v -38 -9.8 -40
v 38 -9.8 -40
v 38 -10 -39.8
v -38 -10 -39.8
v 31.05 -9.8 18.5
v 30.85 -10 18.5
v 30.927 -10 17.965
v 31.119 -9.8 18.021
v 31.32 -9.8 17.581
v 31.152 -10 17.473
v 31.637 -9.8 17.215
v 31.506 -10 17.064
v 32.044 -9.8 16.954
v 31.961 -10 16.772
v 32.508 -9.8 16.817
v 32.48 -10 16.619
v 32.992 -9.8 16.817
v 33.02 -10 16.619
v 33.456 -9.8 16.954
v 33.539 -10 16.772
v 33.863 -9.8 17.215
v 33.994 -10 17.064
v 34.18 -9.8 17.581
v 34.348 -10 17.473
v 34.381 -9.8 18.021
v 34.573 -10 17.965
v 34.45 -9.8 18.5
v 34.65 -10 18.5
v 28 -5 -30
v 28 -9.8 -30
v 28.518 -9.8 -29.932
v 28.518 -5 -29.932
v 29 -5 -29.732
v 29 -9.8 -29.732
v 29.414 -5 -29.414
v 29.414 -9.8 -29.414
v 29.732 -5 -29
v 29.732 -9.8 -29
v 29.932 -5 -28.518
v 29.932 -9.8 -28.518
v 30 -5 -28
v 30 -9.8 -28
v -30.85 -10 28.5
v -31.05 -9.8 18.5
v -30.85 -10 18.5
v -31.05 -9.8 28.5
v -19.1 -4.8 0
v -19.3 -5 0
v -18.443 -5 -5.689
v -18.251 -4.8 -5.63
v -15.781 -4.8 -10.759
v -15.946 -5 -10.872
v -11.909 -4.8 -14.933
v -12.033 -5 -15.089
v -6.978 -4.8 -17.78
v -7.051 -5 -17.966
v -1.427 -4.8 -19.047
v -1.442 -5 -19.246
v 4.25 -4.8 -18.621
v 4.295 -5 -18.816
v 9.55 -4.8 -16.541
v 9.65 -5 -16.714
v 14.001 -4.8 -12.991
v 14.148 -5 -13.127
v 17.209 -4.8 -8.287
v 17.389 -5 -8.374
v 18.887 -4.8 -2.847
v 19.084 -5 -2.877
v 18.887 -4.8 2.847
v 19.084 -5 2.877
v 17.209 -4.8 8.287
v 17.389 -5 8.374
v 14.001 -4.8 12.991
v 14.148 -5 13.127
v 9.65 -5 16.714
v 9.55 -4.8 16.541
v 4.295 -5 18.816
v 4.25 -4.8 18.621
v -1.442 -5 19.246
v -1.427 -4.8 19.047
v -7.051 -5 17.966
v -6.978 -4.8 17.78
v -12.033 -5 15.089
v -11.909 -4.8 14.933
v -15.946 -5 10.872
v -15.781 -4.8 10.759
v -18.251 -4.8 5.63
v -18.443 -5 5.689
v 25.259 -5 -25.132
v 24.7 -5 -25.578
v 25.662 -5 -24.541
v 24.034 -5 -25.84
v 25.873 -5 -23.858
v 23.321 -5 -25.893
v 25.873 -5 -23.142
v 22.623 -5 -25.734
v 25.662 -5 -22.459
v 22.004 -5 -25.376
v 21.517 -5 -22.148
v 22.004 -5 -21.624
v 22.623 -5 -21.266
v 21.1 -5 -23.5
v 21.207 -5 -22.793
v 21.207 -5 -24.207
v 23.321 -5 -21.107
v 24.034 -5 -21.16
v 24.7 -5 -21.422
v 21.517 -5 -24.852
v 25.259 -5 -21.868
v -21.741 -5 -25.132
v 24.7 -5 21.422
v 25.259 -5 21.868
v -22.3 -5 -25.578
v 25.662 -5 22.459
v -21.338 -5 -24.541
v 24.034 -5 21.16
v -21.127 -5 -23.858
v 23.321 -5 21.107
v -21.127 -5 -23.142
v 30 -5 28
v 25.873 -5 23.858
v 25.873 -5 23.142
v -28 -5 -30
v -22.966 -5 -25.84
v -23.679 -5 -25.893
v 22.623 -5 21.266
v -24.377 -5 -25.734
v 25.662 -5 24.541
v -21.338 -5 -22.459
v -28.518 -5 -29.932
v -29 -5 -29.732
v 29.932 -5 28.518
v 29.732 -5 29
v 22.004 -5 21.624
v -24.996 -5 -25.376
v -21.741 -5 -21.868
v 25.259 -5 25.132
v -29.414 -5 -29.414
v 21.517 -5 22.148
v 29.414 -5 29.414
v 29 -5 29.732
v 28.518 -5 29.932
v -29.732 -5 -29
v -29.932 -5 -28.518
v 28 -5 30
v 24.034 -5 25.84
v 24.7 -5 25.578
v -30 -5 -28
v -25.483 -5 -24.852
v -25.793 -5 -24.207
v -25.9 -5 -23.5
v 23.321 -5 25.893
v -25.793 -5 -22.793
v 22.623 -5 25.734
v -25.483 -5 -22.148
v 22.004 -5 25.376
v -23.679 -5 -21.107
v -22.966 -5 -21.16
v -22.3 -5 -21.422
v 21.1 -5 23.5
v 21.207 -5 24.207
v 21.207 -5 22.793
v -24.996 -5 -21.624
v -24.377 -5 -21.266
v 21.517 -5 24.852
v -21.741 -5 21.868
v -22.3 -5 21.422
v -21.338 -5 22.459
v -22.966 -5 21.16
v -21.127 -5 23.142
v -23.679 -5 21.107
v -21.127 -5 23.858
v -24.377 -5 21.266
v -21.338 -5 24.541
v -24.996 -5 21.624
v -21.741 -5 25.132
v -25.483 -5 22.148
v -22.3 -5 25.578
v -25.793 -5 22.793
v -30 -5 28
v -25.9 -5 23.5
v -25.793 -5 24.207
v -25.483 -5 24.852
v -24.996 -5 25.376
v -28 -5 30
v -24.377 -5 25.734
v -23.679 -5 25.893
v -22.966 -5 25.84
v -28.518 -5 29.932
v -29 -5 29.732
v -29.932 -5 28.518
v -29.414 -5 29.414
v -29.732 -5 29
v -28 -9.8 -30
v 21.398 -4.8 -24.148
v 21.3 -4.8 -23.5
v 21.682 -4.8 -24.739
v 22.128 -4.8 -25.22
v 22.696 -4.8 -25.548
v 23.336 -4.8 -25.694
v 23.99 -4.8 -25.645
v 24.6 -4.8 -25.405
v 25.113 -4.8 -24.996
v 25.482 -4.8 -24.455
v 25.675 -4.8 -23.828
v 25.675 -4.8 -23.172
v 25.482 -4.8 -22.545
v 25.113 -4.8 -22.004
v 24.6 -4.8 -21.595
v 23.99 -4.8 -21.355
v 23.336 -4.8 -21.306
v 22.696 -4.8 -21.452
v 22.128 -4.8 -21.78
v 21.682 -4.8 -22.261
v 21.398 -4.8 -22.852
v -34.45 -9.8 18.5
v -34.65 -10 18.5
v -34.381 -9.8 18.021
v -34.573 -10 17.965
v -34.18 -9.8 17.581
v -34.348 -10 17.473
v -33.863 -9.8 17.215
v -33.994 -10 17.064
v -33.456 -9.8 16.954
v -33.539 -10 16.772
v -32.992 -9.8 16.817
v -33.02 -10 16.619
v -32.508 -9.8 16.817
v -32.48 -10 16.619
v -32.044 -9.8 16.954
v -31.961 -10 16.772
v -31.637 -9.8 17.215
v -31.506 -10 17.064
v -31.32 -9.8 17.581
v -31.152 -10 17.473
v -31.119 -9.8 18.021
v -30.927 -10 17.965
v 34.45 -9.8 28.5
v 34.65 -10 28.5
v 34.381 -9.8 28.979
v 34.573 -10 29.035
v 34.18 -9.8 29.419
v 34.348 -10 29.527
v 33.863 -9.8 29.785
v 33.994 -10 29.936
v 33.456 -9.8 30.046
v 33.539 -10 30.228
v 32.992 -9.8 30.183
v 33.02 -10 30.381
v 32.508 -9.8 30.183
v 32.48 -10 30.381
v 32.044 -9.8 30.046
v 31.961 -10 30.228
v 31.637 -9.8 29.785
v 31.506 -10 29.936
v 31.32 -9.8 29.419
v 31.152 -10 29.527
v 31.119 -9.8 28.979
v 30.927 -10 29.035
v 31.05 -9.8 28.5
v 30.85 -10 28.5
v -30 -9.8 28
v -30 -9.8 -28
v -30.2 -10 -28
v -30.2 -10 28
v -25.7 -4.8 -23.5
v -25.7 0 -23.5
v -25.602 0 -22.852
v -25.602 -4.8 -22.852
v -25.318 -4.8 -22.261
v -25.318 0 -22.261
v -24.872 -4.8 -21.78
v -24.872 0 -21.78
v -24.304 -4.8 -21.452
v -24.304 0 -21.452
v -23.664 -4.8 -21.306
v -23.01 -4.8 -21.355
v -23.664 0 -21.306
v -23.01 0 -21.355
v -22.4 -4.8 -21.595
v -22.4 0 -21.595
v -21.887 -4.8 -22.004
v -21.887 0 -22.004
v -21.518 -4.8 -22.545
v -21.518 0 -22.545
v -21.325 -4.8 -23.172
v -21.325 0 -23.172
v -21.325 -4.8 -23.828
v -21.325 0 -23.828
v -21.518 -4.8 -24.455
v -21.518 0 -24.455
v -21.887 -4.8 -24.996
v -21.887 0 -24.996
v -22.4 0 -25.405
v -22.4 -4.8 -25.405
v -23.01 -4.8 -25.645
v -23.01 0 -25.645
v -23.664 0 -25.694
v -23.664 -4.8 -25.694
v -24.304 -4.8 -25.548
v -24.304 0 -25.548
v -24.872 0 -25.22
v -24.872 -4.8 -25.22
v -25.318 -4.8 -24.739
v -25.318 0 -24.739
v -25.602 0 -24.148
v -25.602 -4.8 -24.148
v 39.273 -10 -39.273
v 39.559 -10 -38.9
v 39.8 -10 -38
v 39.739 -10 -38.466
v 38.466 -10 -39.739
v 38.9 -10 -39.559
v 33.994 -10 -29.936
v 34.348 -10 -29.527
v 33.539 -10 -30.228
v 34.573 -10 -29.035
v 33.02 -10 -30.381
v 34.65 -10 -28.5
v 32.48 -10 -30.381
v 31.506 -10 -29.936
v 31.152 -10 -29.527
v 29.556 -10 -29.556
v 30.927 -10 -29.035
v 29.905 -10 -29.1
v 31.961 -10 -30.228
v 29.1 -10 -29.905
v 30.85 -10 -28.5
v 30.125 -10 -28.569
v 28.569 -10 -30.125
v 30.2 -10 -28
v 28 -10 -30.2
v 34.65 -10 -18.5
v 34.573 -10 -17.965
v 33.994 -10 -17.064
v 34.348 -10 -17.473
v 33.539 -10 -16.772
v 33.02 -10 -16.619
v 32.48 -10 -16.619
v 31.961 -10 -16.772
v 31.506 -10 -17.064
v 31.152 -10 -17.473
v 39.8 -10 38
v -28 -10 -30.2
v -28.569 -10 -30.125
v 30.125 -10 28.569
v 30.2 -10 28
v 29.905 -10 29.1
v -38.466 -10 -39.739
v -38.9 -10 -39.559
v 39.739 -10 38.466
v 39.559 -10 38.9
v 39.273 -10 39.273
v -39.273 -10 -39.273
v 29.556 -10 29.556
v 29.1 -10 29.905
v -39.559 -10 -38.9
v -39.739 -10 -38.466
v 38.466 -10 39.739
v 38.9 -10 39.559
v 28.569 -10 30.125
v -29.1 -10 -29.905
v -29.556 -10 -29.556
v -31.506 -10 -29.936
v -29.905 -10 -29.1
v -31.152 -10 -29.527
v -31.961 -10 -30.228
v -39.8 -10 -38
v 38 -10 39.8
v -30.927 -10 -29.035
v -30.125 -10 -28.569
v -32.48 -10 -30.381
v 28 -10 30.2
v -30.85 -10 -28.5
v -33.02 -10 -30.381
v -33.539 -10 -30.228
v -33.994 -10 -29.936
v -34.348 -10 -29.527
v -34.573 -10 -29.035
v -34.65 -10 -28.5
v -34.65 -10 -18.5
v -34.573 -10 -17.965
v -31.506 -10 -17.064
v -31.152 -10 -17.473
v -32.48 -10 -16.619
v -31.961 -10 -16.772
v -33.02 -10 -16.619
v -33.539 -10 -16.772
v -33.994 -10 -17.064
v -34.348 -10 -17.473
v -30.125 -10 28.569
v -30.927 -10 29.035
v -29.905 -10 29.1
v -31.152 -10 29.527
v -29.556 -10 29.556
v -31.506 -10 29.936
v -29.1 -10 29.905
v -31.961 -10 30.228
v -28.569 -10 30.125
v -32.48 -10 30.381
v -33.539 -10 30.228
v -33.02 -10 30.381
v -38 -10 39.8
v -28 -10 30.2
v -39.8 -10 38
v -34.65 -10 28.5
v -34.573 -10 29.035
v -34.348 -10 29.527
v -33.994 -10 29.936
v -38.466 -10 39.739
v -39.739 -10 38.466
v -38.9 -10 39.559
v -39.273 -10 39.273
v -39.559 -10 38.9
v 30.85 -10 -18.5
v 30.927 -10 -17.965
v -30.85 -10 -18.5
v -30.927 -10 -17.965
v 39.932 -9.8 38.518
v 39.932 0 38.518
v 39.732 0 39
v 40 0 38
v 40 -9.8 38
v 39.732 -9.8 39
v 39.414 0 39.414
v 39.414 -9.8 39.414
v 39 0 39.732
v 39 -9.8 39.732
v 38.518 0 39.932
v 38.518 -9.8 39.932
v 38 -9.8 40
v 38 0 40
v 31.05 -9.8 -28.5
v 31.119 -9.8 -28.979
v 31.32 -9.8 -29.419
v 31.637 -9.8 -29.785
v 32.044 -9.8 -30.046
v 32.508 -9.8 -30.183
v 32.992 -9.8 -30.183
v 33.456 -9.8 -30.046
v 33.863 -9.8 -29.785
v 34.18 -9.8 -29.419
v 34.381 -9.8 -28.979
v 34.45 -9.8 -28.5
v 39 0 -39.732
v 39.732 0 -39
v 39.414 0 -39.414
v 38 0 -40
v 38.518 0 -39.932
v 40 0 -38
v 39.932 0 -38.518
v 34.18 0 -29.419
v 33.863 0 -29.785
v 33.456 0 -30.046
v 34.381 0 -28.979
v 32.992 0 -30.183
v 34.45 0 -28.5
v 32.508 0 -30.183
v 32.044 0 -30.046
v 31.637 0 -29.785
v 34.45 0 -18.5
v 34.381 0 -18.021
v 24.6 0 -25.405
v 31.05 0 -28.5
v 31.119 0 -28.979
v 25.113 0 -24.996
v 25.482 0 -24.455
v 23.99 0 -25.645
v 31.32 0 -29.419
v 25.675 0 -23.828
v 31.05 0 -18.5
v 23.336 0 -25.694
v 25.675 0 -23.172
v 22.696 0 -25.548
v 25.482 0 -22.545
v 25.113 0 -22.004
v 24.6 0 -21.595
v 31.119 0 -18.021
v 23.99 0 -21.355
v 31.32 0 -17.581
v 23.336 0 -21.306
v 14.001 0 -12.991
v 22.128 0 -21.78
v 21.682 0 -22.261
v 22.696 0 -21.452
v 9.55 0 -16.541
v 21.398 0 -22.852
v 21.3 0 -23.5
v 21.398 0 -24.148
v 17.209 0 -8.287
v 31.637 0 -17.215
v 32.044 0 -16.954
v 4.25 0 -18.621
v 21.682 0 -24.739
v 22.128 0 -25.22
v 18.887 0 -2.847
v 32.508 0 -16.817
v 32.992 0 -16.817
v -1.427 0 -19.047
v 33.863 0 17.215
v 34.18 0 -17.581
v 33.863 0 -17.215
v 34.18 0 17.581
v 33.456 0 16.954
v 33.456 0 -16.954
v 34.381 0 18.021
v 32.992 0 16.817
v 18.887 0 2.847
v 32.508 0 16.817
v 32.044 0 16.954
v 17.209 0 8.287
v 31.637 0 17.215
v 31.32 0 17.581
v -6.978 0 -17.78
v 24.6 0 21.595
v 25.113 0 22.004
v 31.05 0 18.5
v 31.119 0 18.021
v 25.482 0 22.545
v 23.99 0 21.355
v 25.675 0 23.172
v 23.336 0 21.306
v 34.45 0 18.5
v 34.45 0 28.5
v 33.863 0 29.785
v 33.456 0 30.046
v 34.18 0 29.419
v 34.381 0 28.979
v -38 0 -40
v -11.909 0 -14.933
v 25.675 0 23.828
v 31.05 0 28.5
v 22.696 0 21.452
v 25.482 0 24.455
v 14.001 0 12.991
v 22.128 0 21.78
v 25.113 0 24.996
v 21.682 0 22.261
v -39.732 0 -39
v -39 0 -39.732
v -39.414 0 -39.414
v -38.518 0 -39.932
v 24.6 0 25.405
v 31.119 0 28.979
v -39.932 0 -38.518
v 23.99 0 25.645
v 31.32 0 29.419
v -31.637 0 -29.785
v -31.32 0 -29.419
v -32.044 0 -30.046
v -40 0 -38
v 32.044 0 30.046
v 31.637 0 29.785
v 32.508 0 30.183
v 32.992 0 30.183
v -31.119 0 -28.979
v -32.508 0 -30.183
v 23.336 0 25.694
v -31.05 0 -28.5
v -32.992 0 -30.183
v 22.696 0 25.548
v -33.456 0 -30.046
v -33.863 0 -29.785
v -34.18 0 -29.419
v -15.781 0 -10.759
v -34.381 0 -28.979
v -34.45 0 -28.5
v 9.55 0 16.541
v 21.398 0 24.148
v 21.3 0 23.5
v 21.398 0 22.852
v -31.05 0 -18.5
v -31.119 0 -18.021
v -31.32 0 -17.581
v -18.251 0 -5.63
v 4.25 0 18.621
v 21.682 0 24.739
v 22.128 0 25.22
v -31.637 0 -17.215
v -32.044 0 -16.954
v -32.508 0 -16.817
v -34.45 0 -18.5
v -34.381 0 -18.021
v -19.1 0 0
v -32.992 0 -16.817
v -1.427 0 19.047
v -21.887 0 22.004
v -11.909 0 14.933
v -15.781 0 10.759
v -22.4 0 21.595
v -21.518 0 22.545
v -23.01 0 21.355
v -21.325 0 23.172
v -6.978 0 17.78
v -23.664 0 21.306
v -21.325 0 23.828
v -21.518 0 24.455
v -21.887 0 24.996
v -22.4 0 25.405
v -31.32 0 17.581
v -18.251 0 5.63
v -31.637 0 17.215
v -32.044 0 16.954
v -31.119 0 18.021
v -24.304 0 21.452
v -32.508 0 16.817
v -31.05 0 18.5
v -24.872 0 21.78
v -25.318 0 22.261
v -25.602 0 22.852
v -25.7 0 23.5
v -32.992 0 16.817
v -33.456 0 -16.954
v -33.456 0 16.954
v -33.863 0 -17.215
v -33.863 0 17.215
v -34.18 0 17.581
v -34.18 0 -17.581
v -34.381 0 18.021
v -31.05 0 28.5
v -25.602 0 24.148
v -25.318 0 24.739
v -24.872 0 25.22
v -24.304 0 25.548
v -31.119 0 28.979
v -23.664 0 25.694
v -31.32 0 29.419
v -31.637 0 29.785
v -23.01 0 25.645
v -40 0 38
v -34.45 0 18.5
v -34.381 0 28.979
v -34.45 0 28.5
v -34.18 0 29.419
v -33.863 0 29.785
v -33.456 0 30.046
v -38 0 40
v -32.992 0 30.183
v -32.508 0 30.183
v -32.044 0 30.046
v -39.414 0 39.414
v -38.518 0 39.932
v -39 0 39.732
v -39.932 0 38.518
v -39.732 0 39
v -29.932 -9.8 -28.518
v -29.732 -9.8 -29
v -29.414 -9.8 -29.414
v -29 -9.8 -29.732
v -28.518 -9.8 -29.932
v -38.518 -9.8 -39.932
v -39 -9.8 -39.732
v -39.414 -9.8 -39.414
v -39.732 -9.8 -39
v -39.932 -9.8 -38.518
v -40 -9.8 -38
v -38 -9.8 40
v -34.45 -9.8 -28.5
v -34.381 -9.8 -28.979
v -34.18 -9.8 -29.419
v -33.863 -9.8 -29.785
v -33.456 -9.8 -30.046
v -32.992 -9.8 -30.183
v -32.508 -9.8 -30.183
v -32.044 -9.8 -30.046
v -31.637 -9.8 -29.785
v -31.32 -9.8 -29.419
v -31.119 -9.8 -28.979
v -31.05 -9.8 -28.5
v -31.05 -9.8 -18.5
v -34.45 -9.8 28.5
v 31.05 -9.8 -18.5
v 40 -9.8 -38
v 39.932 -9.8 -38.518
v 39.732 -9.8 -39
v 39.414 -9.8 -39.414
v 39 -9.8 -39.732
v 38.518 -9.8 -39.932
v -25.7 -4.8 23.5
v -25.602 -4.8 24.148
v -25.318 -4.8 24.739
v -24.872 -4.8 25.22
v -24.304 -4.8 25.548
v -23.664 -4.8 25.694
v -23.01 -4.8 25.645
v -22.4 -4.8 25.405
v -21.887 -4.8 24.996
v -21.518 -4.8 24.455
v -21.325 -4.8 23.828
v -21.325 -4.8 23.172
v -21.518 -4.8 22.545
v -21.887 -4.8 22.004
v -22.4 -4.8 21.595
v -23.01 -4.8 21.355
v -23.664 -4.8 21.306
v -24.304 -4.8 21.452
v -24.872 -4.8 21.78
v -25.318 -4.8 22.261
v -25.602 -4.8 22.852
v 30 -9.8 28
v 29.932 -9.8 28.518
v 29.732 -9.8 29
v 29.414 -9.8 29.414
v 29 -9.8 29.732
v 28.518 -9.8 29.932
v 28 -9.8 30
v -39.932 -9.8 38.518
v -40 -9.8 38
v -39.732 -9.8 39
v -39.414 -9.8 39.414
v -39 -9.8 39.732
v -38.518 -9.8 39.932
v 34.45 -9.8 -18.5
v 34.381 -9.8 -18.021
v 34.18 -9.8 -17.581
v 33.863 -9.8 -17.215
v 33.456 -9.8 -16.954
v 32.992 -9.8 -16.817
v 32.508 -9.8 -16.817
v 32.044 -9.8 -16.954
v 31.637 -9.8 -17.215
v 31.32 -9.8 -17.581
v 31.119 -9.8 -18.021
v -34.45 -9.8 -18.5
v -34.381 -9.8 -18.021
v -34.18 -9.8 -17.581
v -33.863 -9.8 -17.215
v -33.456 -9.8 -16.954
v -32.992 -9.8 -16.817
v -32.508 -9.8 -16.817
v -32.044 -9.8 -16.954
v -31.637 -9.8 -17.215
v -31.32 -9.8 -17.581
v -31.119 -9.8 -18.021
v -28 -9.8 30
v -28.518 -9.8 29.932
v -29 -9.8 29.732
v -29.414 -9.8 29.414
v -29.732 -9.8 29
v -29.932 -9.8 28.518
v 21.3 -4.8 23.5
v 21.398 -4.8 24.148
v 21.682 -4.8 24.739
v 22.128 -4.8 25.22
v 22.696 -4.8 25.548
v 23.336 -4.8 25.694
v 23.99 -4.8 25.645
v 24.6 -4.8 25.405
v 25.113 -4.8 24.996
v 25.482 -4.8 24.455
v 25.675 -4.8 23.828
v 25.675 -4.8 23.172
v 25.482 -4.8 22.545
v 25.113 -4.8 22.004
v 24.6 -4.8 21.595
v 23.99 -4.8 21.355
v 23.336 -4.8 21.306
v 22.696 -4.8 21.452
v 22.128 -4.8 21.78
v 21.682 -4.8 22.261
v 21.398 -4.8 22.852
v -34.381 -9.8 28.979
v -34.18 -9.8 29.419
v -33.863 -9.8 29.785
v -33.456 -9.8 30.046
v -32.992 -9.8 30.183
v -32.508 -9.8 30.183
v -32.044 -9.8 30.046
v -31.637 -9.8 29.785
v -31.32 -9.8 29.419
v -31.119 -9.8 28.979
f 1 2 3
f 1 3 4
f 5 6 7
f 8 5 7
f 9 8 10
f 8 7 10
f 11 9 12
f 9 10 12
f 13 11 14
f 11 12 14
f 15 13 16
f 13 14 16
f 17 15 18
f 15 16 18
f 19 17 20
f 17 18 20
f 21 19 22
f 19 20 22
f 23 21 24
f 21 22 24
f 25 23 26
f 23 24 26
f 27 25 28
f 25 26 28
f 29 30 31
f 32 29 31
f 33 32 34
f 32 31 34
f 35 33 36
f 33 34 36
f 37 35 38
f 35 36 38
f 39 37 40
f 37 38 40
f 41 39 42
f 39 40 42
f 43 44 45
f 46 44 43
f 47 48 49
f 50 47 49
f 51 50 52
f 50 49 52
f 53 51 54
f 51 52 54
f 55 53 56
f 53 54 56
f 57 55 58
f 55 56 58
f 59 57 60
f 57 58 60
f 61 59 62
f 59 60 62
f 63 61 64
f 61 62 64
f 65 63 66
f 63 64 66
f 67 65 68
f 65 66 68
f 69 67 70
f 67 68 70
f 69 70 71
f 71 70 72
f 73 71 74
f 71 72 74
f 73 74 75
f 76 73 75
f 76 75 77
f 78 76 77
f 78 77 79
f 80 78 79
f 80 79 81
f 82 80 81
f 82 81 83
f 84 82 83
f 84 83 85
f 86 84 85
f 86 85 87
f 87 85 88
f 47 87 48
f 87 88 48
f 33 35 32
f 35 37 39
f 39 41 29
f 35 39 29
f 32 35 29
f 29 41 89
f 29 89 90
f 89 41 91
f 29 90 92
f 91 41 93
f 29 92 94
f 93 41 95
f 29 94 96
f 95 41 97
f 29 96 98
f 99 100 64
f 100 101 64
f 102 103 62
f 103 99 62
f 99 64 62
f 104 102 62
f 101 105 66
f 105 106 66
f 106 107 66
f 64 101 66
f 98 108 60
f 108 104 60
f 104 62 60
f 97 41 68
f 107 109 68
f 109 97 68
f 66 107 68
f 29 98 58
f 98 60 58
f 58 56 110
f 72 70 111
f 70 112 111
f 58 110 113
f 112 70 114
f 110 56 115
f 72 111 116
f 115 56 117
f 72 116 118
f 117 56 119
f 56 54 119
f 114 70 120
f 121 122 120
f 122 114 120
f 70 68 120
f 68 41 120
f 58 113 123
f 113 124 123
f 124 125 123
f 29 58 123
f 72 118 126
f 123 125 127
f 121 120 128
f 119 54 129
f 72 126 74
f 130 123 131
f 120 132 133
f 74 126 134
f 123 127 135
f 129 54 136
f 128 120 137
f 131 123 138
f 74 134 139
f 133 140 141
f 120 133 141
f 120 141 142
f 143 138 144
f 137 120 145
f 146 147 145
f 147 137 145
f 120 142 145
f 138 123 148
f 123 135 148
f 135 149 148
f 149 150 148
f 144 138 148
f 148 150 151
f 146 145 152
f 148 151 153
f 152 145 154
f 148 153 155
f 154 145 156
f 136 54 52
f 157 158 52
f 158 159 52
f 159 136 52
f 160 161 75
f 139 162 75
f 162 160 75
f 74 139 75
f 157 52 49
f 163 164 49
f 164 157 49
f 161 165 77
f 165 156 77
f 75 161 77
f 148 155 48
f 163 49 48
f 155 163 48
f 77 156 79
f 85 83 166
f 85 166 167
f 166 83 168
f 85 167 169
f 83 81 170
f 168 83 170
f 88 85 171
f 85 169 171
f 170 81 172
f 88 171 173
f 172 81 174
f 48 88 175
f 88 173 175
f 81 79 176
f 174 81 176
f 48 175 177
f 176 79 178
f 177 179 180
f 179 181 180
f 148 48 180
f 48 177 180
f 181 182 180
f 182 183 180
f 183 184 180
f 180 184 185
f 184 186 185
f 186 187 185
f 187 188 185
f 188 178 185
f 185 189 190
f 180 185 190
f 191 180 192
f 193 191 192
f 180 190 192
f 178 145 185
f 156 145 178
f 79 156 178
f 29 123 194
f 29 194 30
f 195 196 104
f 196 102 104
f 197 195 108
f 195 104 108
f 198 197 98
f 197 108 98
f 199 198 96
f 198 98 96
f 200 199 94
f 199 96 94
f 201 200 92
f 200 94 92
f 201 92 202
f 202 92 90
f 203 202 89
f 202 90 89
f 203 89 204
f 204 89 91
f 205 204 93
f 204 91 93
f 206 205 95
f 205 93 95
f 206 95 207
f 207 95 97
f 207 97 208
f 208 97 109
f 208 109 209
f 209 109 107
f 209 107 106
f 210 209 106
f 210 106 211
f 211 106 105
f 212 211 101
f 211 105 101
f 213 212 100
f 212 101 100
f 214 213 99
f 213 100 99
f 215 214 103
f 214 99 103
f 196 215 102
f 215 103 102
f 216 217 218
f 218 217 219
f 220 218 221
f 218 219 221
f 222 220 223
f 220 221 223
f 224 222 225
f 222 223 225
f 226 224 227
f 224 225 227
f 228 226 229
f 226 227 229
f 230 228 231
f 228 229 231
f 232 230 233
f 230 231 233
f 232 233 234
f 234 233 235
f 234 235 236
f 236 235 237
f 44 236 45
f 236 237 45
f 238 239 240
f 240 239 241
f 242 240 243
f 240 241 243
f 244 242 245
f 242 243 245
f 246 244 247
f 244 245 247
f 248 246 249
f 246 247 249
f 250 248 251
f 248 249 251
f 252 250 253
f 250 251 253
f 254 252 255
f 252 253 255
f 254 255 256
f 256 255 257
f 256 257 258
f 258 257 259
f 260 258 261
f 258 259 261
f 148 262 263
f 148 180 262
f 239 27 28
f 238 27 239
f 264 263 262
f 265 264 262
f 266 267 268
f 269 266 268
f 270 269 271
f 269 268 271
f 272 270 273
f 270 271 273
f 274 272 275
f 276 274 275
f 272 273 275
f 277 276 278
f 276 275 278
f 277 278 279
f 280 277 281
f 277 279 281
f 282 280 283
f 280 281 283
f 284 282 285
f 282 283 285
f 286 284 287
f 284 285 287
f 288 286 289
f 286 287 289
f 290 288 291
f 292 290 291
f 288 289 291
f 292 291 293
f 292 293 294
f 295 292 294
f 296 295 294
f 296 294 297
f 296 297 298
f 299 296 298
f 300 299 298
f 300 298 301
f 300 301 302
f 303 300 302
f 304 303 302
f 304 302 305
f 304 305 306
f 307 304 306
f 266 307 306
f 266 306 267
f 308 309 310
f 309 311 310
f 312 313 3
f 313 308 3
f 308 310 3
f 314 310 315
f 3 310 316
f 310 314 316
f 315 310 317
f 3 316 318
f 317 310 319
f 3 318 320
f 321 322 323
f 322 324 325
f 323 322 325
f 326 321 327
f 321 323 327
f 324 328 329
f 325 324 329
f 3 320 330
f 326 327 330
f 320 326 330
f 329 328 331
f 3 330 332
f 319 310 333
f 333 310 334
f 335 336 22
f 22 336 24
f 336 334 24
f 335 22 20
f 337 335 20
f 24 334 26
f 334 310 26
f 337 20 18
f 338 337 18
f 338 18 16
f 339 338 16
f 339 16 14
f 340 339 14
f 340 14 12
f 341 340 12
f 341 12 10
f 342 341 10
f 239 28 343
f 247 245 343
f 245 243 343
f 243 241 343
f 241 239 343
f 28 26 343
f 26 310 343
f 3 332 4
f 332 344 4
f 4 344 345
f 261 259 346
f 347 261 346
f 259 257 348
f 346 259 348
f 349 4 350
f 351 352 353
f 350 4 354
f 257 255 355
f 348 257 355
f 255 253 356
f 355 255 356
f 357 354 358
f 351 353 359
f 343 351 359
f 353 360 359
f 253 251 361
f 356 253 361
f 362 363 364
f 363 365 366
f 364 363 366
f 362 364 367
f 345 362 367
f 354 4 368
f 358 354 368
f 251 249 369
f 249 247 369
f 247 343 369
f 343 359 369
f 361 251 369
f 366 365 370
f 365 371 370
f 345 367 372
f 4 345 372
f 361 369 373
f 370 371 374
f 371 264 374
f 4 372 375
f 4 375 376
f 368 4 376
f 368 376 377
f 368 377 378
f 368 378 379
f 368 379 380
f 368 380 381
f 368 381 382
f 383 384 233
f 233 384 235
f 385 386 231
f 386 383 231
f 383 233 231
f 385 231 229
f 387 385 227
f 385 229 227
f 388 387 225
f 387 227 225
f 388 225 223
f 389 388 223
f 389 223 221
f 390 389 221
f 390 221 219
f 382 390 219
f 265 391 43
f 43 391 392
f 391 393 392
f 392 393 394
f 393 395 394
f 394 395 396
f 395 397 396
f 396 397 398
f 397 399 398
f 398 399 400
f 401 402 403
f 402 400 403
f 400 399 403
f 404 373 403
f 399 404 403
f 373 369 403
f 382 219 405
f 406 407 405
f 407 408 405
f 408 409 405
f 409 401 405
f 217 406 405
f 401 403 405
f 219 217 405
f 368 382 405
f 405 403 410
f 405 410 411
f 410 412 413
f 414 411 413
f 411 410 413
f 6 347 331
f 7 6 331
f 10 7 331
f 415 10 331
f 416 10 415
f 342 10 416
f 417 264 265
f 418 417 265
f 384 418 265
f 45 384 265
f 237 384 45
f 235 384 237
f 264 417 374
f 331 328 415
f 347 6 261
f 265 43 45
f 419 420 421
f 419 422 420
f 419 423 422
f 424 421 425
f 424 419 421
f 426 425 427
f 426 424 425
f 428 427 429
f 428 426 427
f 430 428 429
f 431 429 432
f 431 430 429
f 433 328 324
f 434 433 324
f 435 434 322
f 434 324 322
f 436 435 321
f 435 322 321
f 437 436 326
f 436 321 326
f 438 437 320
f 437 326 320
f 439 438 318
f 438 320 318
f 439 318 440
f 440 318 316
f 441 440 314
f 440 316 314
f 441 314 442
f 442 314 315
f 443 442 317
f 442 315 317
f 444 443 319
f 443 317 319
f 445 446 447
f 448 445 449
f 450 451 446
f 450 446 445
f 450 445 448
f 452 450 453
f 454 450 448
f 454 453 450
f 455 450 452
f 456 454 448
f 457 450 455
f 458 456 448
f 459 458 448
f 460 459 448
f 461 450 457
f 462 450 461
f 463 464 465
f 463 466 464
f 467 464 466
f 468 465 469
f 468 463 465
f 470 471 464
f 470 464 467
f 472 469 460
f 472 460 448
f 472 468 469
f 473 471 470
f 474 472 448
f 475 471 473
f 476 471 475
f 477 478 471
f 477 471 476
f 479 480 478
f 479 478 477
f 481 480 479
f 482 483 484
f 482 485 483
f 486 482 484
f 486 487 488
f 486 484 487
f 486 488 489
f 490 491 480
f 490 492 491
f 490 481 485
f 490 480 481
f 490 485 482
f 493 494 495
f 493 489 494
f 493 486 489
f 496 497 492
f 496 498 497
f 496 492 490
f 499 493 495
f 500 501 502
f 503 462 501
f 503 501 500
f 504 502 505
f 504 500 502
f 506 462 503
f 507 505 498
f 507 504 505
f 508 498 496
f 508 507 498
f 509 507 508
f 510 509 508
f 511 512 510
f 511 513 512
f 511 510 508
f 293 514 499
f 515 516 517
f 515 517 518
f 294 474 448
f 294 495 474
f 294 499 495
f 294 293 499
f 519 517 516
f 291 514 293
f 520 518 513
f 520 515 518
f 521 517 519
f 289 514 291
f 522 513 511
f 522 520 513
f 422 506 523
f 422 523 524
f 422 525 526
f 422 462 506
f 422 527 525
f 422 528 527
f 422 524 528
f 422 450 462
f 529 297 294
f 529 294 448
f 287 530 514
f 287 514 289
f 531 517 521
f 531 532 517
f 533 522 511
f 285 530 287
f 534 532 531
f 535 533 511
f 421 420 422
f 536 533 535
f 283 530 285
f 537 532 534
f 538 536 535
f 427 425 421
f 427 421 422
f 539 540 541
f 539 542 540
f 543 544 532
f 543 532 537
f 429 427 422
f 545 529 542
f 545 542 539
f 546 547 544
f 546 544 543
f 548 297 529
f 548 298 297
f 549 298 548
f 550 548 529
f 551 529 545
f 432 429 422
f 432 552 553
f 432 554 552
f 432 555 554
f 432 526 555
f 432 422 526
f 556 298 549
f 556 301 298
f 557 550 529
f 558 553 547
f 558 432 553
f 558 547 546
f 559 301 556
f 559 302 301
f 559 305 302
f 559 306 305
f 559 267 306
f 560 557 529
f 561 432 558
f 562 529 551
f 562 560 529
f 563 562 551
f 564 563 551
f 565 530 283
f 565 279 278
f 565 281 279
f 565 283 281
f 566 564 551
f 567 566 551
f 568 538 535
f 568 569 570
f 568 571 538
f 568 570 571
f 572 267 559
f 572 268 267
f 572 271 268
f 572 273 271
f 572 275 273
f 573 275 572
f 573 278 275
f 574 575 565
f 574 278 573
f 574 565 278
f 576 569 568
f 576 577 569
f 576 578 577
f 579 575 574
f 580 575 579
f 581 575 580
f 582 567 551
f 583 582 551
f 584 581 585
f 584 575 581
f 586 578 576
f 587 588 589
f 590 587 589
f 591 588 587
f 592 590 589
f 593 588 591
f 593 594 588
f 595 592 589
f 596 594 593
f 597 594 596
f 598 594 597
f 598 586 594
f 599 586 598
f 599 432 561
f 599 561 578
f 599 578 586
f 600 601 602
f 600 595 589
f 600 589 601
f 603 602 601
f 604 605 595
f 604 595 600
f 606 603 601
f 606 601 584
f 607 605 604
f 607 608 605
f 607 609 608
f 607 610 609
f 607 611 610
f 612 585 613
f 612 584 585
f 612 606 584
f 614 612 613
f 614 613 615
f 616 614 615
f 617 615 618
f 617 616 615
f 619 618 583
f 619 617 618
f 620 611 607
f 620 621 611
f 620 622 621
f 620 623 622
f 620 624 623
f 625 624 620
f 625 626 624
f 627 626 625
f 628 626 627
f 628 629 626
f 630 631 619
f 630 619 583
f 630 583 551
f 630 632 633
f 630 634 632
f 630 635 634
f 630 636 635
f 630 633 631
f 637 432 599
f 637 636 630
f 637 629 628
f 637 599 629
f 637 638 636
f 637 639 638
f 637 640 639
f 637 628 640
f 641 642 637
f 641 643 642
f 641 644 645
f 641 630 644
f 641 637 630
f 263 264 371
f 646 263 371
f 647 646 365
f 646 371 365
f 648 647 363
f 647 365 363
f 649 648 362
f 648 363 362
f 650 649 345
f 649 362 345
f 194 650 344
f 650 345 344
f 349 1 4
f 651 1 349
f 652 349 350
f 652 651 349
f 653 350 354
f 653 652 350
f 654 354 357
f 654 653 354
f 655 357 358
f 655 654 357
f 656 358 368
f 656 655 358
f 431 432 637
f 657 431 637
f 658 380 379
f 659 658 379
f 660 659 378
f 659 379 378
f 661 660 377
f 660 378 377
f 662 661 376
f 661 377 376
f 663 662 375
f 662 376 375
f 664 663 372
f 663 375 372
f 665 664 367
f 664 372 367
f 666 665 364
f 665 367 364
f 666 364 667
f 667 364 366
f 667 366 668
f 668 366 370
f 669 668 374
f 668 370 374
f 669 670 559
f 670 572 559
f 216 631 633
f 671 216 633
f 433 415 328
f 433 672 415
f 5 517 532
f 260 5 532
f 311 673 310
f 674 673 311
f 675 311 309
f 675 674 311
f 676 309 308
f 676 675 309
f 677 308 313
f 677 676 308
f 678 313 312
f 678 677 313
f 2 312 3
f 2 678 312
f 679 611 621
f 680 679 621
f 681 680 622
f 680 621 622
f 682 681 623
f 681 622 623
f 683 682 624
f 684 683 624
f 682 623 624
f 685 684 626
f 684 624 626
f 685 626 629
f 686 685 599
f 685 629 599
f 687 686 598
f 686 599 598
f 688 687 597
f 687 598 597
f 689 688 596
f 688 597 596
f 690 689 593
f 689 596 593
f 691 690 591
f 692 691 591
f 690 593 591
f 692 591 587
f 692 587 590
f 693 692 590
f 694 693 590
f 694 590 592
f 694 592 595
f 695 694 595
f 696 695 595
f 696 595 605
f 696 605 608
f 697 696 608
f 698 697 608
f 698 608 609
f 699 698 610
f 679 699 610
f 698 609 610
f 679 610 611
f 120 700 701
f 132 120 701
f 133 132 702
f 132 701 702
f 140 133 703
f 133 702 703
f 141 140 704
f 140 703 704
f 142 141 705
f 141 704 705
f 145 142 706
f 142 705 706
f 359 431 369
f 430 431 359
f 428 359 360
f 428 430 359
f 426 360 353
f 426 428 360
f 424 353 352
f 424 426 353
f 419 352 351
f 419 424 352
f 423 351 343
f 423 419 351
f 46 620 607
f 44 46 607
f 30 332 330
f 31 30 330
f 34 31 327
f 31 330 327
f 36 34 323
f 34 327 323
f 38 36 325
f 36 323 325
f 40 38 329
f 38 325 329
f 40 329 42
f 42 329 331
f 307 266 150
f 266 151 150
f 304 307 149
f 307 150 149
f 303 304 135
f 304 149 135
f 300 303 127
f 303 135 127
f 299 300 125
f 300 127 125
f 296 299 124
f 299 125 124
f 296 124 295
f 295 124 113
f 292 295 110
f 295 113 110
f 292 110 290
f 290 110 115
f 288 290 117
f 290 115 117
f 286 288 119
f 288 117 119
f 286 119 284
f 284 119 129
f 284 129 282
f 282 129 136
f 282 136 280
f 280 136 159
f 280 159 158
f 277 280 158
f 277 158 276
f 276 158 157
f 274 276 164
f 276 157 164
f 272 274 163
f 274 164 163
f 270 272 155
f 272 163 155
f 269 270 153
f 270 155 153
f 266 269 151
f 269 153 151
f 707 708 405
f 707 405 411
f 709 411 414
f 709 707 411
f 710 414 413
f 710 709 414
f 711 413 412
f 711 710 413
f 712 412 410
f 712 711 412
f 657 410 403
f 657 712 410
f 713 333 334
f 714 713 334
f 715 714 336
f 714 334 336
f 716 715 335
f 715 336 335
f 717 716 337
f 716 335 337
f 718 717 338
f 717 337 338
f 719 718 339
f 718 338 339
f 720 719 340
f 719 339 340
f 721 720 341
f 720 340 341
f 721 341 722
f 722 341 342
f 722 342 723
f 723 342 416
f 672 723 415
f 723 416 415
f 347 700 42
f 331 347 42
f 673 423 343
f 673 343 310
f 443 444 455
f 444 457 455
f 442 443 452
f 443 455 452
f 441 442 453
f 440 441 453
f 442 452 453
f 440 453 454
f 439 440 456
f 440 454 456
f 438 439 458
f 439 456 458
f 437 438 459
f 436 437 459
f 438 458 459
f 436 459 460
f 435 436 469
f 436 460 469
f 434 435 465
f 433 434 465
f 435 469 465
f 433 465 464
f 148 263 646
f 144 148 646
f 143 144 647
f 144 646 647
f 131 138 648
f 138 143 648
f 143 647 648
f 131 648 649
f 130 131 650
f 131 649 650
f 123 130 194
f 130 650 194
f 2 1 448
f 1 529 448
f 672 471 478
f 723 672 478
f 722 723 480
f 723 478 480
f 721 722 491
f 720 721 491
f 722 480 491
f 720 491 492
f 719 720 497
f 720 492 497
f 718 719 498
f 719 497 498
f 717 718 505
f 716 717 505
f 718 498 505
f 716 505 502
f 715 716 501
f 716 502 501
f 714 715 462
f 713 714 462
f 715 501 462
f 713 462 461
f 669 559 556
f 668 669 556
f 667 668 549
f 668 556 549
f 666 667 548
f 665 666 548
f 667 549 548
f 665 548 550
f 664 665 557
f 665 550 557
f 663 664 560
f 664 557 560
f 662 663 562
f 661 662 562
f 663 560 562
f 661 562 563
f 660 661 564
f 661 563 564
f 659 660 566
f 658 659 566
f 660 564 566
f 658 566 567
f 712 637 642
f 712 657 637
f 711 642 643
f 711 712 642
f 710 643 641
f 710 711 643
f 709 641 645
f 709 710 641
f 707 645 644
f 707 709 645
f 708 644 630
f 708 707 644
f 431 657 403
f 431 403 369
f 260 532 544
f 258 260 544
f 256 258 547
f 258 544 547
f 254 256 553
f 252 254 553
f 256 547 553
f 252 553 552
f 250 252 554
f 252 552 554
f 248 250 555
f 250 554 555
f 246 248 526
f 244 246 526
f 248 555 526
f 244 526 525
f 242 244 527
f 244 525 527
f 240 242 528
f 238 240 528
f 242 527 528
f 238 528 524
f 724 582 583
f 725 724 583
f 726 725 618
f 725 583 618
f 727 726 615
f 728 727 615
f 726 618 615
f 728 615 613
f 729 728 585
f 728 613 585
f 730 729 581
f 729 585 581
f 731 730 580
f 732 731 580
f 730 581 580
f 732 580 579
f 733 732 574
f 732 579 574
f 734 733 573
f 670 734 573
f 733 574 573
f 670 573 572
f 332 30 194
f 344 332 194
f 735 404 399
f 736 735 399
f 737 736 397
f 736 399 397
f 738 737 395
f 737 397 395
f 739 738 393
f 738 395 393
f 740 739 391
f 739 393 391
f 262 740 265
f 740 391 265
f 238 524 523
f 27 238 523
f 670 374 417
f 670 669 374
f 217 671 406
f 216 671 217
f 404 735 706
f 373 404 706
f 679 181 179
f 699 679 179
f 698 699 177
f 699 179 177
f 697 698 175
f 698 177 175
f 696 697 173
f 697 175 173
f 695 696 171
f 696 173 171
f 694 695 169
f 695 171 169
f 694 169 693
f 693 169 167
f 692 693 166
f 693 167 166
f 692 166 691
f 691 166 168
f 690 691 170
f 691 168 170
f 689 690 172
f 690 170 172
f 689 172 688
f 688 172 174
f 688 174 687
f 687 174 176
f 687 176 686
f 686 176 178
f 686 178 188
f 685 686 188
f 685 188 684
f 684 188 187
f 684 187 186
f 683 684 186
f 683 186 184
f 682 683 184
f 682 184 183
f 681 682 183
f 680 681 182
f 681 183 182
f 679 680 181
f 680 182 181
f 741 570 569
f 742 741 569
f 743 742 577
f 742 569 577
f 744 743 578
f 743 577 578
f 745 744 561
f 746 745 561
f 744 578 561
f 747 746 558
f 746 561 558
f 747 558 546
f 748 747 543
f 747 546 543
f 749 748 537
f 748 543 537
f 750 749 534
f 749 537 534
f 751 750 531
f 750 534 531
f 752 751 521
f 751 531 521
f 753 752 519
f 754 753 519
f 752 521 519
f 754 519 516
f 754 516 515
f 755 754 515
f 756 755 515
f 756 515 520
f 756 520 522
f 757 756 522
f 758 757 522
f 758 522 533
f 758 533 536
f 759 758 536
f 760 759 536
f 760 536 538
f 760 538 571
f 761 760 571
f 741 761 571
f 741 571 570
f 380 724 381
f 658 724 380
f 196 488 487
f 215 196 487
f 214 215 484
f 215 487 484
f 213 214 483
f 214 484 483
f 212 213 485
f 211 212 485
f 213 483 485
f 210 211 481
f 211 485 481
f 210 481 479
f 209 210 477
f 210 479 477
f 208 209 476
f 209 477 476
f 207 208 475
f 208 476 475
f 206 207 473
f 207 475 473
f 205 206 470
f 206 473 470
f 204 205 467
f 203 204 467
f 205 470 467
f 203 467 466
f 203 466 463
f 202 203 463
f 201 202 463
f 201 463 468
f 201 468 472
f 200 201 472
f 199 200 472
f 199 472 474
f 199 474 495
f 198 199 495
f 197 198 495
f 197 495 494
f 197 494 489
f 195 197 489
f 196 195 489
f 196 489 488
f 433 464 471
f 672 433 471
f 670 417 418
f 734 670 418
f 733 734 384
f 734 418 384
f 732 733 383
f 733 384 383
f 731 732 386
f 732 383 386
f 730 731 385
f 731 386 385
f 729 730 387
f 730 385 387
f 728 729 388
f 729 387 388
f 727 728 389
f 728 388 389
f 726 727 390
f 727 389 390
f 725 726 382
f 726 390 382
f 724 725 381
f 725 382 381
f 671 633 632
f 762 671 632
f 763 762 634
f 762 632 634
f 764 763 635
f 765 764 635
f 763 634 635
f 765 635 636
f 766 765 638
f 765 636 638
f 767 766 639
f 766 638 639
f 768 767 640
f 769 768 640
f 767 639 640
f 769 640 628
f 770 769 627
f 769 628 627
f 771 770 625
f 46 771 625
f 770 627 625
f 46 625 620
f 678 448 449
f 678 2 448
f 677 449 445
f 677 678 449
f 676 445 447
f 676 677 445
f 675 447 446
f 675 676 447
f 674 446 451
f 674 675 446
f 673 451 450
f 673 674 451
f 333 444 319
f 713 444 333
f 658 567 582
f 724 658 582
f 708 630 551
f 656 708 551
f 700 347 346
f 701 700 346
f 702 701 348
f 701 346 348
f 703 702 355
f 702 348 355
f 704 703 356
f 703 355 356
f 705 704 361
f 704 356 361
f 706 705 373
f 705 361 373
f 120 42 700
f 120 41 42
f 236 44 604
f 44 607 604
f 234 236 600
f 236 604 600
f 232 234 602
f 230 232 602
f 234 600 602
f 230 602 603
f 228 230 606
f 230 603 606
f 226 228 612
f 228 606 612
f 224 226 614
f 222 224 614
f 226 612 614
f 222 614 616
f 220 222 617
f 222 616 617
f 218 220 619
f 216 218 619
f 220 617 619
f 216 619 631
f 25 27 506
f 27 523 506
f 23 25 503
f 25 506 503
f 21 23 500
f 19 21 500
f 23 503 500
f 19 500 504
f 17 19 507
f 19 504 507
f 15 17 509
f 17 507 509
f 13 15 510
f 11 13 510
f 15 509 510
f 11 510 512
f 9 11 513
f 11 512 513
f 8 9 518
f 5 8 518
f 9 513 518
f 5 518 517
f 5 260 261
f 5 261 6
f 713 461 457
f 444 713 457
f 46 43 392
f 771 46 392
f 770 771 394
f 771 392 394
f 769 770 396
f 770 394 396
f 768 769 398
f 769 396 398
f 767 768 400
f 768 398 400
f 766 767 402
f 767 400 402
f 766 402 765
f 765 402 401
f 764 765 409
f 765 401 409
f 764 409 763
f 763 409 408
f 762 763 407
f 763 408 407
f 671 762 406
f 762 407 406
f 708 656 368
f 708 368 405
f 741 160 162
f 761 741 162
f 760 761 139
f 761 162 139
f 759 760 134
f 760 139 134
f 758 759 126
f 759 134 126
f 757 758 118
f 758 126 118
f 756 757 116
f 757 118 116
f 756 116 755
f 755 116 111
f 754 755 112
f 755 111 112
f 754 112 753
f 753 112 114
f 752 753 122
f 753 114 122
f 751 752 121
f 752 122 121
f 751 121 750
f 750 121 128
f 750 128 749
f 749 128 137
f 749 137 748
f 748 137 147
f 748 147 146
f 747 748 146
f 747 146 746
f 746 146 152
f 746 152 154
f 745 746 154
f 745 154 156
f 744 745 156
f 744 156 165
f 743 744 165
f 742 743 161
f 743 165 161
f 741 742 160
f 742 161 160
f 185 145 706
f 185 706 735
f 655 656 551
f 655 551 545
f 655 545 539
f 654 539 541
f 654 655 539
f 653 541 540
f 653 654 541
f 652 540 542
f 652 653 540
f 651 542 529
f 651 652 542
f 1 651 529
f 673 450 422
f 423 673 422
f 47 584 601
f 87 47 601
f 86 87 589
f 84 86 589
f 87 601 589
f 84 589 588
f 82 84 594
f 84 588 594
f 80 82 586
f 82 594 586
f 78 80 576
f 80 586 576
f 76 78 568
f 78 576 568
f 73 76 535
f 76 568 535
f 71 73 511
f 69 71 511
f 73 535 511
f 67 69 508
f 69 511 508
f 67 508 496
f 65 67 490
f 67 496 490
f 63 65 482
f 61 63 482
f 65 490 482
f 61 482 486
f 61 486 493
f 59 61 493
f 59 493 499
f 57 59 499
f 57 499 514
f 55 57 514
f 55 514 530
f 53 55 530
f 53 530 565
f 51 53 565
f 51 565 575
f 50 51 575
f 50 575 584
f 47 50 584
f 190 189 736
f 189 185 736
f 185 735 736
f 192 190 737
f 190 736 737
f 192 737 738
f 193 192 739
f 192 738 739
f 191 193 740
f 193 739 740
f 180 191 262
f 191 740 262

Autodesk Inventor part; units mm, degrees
ref_plane "YZ Plane" through (0, 0, 0) normal (1, 0, 0) x (0, 1, 0)
ref_plane "XZ Plane" through (0, 0, 0) normal (0, 1, 0) x (-1, 0, 0)
ref_plane "XY Plane" through (0, 0, 0) normal (0, 0, 1) x (1, 0, 0)
sketch "Skizze1" plane through (0, 0, 0) normal (0, 1, 0) x (-1, 0, 0)
  circle A0 centre (0, 0) radius 19.1
  line L0 (-23.5, 23.5) -> (23.5, 23.5) construction
  line L1 (23.5, 23.5) -> (23.5, -23.5) construction
  line L2 (23.5, -23.5) -> (-23.5, -23.5) construction
  line L3 (-23.5, -23.5) -> (-23.5, 23.5) construction
  line L4 (-23.5, 23.5) -> (23.5, -23.5) construction
  line L5 (23.5, 23.5) -> (-23.5, -23.5) construction
  circle A1 centre (23.5, -23.5) radius 2.2
  circle A2 centre (23.5, 23.5) radius 2.2
  circle A3 centre (-23.5, 23.5) radius 2.2
  circle A4 centre (-23.5, -23.5) radius 2.2
  line L6 (-40, 40) -> (40, 40)
  line L7 (40, 40) -> (40, -40)
  line L8 (40, -40) -> (-40, -40)
  line L9 (-40, -40) -> (-40, 40)
  line L10 (-40, 40) -> (40, -40) construction
  line L11 (40, 40) -> (-40, -40) construction
  line L12 (-32.75, 23.5) -> (32.75, 23.5) construction
  line L13 (32.75, 23.5) -> (32.75, -23.5) construction
  line L14 (32.75, -23.5) -> (-32.75, -23.5) construction
  line L15 (-32.75, -23.5) -> (-32.75, 23.5) construction
  line L16 (-32.75, 23.5) -> (32.75, -23.5) construction
  line L17 (32.75, 23.5) -> (-32.75, -23.5) construction
  line L18 (32.75, -18.5) -> (32.75, -28.5) construction
  line L19 (31.05, -18.5) -> (31.05, -28.5)
  line L20 (34.45, -28.5) -> (34.45, -18.5)
  arc A5 (34.45, -18.5) -> (31.05, -18.5) centre (32.75, -18.5) ccw
  arc A6 (31.05, -28.5) -> (34.45, -28.5) centre (32.75, -28.5) ccw
  line L21 (32.75, 28.5) -> (32.75, 18.5) construction
  line L22 (31.05, 28.5) -> (31.05, 18.5)
  line L23 (34.45, 18.5) -> (34.45, 28.5)
  arc A7 (34.45, 28.5) -> (31.05, 28.5) centre (32.75, 28.5) ccw
  arc A8 (31.05, 18.5) -> (34.45, 18.5) centre (32.75, 18.5) ccw
  line L24 (-32.75, 28.5) -> (-32.75, 18.5) construction
  line L25 (-34.45, 28.5) -> (-34.45, 18.5)
  line L26 (-31.05, 18.5) -> (-31.05, 28.5)
  arc A9 (-31.05, 28.5) -> (-34.45, 28.5) centre (-32.75, 28.5) ccw
  arc A10 (-34.45, 18.5) -> (-31.05, 18.5) centre (-32.75, 18.5) ccw
  line L27 (-32.75, -18.5) -> (-32.75, -28.5) construction
  line L28 (-34.45, -18.5) -> (-34.45, -28.5)
  line L29 (-31.05, -28.5) -> (-31.05, -18.5)
  arc A11 (-31.05, -18.5) -> (-34.45, -18.5) centre (-32.75, -18.5) ccw
  arc A12 (-34.45, -28.5) -> (-31.05, -28.5) centre (-32.75, -28.5) ccw
  line L30 (-30, 30) -> (30, 30)
  line L31 (30, 30) -> (30, -30)
  line L32 (30, -30) -> (-30, -30)
  line L33 (-30, -30) -> (-30, 30)
  line L34 (-30, 30) -> (30, -30) construction
  line L35 (30, 30) -> (-30, -30) construction
  dimension "d31" = 38.2
  dimension "d32" = 47
  dimension "d33" = 47
  dimension "d34" = 4.4
  dimension "d35" = 4.4
  dimension "d36" = 4.4
  dimension "d37" = 4.4
  dimension "d38" = 80
  dimension "d39" = 80
  dimension "d40" = 65.5
  dimension "d41" = 47
  dimension "d42" = 5
  dimension "d43" = 3.4
  dimension "d44" = 5
  dimension "d45" = 3.4
  dimension "d46" = 5
  dimension "d47" = 3.4
  dimension "d48" = 5
  dimension "d49" = 3.4
  dimension "d50" = 60
  dimension "d51" = 60
extrude "Extrusion1" add sketch "Skizze1" against normal blind 10 contours L6 L7 L8 L9
extrude "Extrusion2" add sketch "Skizze1" against normal blind 5 contours L30 L31 L32 L33
fillet "Rundung1" radius 2 8 edges at (-40, -5, 40) (40, -5, -40) (-40, -5, -40) (40, -5, 40) (30, -7.5, 30) (-30, -7.5, -30) (30, -7.5, -30) (-30, -7.5, 30)
chamfer "Fase1" distance 0.2 angle 45 33 edges at (25.7, -5, 23.5) (30, -10, 0) (0, -10, -30) (-30, -10, 0) (0, -10, 30) (32.75, -10, 16.8) (31.05, -10, 23.5) (32.75, -10, 30.2) (34.45, -10, 23.5) (19.1, -5, 0) (25.7, -5, -23.5) (-21.3, -5, -23.5) (-21.3, -5, 23.5) (-32.75, -10, 16.8) (-34.45, -10, 23.5) (-32.75, -10, 30.2) (-31.05, -10, 23.5) (-32.75, -10, -16.8) (-31.05, -10, -23.5) (-32.75, -10, -30.2) (-34.45, -10, -23.5) (0, -10, -40) (39.4142, -10, -39.4142) (40, -10, 0) (39.4142, -10, 39.4142) (0, -10, 40) (-39.4142, -10, 39.4142) (-40, -10, 0) (-39.4142, -10, -39.4142) (32.75, -10, -16.8) (34.45, -10, -23.5) (32.75, -10, -30.2) (31.05, -10, -23.5)
thread "Gewinde1" size "M5x0.8" class "6H" standard "ANSI Metric M Profile" full length
thread "Gewinde2" size "M5x0.8" class "6H" standard "ANSI Metric M Profile" full length
thread "Gewinde3" size "M5x0.8" class "6H" standard "ANSI Metric M Profile" full length
thread "Gewinde4" size "M5x0.8" class "6H" standard "ANSI Metric M Profile" full length
properties part number "Z-Motoraufnahme" material "Aluminium 6061"
